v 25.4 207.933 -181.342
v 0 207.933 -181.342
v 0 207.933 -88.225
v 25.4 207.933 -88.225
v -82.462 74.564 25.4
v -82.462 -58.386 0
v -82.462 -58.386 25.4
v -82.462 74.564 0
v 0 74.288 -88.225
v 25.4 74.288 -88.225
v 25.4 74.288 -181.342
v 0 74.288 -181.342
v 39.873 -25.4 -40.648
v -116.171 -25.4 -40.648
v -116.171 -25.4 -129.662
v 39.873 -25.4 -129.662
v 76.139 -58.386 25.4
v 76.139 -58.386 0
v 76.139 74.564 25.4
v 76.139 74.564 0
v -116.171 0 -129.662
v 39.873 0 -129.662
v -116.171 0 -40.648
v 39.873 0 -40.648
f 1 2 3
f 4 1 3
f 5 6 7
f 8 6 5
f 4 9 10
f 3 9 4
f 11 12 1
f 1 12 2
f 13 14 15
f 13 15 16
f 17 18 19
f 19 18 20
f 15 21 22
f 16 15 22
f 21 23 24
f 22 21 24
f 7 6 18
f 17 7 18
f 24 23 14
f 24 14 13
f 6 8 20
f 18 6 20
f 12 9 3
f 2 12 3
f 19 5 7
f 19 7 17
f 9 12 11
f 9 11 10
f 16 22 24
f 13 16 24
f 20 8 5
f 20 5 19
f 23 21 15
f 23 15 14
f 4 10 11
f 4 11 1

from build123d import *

# Parameters (mm, degrees)
F0_W     = 158.600218
F0_H     = 132.949639
F1_DEPTH = 25.4
F2_W     = 133.644551
F2_H     = 93.116939
F3_DEPTH = 25.4
F4_W     = 156.043697
F4_H     = 89.013711
F5_DEPTH = 25.4


with BuildPart() as f1:
    # F0 (on Top) → F1 (new body)
    with BuildSketch(Plane.XY):
        with Locations((-3.161516, 8.089078)):
            Rectangle(F0_W, F0_H)
    extrude(amount=F1_DEPTH)


with BuildPart() as f3:
    # F2 (on Right) → F3 (new body)
    with BuildSketch(Plane.YZ):
        with Locations((141.110748, -134.783312)):
            Rectangle(F2_W, F2_H)
    extrude(amount=F3_DEPTH)


with BuildPart() as f5:
    # F4 (on Front) → F5 (new body)
    with BuildSketch(Plane.XZ):
        with Locations((-38.148803, -85.154928)):
            Rectangle(F4_W, F4_H)
    extrude(amount=F5_DEPTH)


solid = Compound([f1.part, f3.part, f5.part])
